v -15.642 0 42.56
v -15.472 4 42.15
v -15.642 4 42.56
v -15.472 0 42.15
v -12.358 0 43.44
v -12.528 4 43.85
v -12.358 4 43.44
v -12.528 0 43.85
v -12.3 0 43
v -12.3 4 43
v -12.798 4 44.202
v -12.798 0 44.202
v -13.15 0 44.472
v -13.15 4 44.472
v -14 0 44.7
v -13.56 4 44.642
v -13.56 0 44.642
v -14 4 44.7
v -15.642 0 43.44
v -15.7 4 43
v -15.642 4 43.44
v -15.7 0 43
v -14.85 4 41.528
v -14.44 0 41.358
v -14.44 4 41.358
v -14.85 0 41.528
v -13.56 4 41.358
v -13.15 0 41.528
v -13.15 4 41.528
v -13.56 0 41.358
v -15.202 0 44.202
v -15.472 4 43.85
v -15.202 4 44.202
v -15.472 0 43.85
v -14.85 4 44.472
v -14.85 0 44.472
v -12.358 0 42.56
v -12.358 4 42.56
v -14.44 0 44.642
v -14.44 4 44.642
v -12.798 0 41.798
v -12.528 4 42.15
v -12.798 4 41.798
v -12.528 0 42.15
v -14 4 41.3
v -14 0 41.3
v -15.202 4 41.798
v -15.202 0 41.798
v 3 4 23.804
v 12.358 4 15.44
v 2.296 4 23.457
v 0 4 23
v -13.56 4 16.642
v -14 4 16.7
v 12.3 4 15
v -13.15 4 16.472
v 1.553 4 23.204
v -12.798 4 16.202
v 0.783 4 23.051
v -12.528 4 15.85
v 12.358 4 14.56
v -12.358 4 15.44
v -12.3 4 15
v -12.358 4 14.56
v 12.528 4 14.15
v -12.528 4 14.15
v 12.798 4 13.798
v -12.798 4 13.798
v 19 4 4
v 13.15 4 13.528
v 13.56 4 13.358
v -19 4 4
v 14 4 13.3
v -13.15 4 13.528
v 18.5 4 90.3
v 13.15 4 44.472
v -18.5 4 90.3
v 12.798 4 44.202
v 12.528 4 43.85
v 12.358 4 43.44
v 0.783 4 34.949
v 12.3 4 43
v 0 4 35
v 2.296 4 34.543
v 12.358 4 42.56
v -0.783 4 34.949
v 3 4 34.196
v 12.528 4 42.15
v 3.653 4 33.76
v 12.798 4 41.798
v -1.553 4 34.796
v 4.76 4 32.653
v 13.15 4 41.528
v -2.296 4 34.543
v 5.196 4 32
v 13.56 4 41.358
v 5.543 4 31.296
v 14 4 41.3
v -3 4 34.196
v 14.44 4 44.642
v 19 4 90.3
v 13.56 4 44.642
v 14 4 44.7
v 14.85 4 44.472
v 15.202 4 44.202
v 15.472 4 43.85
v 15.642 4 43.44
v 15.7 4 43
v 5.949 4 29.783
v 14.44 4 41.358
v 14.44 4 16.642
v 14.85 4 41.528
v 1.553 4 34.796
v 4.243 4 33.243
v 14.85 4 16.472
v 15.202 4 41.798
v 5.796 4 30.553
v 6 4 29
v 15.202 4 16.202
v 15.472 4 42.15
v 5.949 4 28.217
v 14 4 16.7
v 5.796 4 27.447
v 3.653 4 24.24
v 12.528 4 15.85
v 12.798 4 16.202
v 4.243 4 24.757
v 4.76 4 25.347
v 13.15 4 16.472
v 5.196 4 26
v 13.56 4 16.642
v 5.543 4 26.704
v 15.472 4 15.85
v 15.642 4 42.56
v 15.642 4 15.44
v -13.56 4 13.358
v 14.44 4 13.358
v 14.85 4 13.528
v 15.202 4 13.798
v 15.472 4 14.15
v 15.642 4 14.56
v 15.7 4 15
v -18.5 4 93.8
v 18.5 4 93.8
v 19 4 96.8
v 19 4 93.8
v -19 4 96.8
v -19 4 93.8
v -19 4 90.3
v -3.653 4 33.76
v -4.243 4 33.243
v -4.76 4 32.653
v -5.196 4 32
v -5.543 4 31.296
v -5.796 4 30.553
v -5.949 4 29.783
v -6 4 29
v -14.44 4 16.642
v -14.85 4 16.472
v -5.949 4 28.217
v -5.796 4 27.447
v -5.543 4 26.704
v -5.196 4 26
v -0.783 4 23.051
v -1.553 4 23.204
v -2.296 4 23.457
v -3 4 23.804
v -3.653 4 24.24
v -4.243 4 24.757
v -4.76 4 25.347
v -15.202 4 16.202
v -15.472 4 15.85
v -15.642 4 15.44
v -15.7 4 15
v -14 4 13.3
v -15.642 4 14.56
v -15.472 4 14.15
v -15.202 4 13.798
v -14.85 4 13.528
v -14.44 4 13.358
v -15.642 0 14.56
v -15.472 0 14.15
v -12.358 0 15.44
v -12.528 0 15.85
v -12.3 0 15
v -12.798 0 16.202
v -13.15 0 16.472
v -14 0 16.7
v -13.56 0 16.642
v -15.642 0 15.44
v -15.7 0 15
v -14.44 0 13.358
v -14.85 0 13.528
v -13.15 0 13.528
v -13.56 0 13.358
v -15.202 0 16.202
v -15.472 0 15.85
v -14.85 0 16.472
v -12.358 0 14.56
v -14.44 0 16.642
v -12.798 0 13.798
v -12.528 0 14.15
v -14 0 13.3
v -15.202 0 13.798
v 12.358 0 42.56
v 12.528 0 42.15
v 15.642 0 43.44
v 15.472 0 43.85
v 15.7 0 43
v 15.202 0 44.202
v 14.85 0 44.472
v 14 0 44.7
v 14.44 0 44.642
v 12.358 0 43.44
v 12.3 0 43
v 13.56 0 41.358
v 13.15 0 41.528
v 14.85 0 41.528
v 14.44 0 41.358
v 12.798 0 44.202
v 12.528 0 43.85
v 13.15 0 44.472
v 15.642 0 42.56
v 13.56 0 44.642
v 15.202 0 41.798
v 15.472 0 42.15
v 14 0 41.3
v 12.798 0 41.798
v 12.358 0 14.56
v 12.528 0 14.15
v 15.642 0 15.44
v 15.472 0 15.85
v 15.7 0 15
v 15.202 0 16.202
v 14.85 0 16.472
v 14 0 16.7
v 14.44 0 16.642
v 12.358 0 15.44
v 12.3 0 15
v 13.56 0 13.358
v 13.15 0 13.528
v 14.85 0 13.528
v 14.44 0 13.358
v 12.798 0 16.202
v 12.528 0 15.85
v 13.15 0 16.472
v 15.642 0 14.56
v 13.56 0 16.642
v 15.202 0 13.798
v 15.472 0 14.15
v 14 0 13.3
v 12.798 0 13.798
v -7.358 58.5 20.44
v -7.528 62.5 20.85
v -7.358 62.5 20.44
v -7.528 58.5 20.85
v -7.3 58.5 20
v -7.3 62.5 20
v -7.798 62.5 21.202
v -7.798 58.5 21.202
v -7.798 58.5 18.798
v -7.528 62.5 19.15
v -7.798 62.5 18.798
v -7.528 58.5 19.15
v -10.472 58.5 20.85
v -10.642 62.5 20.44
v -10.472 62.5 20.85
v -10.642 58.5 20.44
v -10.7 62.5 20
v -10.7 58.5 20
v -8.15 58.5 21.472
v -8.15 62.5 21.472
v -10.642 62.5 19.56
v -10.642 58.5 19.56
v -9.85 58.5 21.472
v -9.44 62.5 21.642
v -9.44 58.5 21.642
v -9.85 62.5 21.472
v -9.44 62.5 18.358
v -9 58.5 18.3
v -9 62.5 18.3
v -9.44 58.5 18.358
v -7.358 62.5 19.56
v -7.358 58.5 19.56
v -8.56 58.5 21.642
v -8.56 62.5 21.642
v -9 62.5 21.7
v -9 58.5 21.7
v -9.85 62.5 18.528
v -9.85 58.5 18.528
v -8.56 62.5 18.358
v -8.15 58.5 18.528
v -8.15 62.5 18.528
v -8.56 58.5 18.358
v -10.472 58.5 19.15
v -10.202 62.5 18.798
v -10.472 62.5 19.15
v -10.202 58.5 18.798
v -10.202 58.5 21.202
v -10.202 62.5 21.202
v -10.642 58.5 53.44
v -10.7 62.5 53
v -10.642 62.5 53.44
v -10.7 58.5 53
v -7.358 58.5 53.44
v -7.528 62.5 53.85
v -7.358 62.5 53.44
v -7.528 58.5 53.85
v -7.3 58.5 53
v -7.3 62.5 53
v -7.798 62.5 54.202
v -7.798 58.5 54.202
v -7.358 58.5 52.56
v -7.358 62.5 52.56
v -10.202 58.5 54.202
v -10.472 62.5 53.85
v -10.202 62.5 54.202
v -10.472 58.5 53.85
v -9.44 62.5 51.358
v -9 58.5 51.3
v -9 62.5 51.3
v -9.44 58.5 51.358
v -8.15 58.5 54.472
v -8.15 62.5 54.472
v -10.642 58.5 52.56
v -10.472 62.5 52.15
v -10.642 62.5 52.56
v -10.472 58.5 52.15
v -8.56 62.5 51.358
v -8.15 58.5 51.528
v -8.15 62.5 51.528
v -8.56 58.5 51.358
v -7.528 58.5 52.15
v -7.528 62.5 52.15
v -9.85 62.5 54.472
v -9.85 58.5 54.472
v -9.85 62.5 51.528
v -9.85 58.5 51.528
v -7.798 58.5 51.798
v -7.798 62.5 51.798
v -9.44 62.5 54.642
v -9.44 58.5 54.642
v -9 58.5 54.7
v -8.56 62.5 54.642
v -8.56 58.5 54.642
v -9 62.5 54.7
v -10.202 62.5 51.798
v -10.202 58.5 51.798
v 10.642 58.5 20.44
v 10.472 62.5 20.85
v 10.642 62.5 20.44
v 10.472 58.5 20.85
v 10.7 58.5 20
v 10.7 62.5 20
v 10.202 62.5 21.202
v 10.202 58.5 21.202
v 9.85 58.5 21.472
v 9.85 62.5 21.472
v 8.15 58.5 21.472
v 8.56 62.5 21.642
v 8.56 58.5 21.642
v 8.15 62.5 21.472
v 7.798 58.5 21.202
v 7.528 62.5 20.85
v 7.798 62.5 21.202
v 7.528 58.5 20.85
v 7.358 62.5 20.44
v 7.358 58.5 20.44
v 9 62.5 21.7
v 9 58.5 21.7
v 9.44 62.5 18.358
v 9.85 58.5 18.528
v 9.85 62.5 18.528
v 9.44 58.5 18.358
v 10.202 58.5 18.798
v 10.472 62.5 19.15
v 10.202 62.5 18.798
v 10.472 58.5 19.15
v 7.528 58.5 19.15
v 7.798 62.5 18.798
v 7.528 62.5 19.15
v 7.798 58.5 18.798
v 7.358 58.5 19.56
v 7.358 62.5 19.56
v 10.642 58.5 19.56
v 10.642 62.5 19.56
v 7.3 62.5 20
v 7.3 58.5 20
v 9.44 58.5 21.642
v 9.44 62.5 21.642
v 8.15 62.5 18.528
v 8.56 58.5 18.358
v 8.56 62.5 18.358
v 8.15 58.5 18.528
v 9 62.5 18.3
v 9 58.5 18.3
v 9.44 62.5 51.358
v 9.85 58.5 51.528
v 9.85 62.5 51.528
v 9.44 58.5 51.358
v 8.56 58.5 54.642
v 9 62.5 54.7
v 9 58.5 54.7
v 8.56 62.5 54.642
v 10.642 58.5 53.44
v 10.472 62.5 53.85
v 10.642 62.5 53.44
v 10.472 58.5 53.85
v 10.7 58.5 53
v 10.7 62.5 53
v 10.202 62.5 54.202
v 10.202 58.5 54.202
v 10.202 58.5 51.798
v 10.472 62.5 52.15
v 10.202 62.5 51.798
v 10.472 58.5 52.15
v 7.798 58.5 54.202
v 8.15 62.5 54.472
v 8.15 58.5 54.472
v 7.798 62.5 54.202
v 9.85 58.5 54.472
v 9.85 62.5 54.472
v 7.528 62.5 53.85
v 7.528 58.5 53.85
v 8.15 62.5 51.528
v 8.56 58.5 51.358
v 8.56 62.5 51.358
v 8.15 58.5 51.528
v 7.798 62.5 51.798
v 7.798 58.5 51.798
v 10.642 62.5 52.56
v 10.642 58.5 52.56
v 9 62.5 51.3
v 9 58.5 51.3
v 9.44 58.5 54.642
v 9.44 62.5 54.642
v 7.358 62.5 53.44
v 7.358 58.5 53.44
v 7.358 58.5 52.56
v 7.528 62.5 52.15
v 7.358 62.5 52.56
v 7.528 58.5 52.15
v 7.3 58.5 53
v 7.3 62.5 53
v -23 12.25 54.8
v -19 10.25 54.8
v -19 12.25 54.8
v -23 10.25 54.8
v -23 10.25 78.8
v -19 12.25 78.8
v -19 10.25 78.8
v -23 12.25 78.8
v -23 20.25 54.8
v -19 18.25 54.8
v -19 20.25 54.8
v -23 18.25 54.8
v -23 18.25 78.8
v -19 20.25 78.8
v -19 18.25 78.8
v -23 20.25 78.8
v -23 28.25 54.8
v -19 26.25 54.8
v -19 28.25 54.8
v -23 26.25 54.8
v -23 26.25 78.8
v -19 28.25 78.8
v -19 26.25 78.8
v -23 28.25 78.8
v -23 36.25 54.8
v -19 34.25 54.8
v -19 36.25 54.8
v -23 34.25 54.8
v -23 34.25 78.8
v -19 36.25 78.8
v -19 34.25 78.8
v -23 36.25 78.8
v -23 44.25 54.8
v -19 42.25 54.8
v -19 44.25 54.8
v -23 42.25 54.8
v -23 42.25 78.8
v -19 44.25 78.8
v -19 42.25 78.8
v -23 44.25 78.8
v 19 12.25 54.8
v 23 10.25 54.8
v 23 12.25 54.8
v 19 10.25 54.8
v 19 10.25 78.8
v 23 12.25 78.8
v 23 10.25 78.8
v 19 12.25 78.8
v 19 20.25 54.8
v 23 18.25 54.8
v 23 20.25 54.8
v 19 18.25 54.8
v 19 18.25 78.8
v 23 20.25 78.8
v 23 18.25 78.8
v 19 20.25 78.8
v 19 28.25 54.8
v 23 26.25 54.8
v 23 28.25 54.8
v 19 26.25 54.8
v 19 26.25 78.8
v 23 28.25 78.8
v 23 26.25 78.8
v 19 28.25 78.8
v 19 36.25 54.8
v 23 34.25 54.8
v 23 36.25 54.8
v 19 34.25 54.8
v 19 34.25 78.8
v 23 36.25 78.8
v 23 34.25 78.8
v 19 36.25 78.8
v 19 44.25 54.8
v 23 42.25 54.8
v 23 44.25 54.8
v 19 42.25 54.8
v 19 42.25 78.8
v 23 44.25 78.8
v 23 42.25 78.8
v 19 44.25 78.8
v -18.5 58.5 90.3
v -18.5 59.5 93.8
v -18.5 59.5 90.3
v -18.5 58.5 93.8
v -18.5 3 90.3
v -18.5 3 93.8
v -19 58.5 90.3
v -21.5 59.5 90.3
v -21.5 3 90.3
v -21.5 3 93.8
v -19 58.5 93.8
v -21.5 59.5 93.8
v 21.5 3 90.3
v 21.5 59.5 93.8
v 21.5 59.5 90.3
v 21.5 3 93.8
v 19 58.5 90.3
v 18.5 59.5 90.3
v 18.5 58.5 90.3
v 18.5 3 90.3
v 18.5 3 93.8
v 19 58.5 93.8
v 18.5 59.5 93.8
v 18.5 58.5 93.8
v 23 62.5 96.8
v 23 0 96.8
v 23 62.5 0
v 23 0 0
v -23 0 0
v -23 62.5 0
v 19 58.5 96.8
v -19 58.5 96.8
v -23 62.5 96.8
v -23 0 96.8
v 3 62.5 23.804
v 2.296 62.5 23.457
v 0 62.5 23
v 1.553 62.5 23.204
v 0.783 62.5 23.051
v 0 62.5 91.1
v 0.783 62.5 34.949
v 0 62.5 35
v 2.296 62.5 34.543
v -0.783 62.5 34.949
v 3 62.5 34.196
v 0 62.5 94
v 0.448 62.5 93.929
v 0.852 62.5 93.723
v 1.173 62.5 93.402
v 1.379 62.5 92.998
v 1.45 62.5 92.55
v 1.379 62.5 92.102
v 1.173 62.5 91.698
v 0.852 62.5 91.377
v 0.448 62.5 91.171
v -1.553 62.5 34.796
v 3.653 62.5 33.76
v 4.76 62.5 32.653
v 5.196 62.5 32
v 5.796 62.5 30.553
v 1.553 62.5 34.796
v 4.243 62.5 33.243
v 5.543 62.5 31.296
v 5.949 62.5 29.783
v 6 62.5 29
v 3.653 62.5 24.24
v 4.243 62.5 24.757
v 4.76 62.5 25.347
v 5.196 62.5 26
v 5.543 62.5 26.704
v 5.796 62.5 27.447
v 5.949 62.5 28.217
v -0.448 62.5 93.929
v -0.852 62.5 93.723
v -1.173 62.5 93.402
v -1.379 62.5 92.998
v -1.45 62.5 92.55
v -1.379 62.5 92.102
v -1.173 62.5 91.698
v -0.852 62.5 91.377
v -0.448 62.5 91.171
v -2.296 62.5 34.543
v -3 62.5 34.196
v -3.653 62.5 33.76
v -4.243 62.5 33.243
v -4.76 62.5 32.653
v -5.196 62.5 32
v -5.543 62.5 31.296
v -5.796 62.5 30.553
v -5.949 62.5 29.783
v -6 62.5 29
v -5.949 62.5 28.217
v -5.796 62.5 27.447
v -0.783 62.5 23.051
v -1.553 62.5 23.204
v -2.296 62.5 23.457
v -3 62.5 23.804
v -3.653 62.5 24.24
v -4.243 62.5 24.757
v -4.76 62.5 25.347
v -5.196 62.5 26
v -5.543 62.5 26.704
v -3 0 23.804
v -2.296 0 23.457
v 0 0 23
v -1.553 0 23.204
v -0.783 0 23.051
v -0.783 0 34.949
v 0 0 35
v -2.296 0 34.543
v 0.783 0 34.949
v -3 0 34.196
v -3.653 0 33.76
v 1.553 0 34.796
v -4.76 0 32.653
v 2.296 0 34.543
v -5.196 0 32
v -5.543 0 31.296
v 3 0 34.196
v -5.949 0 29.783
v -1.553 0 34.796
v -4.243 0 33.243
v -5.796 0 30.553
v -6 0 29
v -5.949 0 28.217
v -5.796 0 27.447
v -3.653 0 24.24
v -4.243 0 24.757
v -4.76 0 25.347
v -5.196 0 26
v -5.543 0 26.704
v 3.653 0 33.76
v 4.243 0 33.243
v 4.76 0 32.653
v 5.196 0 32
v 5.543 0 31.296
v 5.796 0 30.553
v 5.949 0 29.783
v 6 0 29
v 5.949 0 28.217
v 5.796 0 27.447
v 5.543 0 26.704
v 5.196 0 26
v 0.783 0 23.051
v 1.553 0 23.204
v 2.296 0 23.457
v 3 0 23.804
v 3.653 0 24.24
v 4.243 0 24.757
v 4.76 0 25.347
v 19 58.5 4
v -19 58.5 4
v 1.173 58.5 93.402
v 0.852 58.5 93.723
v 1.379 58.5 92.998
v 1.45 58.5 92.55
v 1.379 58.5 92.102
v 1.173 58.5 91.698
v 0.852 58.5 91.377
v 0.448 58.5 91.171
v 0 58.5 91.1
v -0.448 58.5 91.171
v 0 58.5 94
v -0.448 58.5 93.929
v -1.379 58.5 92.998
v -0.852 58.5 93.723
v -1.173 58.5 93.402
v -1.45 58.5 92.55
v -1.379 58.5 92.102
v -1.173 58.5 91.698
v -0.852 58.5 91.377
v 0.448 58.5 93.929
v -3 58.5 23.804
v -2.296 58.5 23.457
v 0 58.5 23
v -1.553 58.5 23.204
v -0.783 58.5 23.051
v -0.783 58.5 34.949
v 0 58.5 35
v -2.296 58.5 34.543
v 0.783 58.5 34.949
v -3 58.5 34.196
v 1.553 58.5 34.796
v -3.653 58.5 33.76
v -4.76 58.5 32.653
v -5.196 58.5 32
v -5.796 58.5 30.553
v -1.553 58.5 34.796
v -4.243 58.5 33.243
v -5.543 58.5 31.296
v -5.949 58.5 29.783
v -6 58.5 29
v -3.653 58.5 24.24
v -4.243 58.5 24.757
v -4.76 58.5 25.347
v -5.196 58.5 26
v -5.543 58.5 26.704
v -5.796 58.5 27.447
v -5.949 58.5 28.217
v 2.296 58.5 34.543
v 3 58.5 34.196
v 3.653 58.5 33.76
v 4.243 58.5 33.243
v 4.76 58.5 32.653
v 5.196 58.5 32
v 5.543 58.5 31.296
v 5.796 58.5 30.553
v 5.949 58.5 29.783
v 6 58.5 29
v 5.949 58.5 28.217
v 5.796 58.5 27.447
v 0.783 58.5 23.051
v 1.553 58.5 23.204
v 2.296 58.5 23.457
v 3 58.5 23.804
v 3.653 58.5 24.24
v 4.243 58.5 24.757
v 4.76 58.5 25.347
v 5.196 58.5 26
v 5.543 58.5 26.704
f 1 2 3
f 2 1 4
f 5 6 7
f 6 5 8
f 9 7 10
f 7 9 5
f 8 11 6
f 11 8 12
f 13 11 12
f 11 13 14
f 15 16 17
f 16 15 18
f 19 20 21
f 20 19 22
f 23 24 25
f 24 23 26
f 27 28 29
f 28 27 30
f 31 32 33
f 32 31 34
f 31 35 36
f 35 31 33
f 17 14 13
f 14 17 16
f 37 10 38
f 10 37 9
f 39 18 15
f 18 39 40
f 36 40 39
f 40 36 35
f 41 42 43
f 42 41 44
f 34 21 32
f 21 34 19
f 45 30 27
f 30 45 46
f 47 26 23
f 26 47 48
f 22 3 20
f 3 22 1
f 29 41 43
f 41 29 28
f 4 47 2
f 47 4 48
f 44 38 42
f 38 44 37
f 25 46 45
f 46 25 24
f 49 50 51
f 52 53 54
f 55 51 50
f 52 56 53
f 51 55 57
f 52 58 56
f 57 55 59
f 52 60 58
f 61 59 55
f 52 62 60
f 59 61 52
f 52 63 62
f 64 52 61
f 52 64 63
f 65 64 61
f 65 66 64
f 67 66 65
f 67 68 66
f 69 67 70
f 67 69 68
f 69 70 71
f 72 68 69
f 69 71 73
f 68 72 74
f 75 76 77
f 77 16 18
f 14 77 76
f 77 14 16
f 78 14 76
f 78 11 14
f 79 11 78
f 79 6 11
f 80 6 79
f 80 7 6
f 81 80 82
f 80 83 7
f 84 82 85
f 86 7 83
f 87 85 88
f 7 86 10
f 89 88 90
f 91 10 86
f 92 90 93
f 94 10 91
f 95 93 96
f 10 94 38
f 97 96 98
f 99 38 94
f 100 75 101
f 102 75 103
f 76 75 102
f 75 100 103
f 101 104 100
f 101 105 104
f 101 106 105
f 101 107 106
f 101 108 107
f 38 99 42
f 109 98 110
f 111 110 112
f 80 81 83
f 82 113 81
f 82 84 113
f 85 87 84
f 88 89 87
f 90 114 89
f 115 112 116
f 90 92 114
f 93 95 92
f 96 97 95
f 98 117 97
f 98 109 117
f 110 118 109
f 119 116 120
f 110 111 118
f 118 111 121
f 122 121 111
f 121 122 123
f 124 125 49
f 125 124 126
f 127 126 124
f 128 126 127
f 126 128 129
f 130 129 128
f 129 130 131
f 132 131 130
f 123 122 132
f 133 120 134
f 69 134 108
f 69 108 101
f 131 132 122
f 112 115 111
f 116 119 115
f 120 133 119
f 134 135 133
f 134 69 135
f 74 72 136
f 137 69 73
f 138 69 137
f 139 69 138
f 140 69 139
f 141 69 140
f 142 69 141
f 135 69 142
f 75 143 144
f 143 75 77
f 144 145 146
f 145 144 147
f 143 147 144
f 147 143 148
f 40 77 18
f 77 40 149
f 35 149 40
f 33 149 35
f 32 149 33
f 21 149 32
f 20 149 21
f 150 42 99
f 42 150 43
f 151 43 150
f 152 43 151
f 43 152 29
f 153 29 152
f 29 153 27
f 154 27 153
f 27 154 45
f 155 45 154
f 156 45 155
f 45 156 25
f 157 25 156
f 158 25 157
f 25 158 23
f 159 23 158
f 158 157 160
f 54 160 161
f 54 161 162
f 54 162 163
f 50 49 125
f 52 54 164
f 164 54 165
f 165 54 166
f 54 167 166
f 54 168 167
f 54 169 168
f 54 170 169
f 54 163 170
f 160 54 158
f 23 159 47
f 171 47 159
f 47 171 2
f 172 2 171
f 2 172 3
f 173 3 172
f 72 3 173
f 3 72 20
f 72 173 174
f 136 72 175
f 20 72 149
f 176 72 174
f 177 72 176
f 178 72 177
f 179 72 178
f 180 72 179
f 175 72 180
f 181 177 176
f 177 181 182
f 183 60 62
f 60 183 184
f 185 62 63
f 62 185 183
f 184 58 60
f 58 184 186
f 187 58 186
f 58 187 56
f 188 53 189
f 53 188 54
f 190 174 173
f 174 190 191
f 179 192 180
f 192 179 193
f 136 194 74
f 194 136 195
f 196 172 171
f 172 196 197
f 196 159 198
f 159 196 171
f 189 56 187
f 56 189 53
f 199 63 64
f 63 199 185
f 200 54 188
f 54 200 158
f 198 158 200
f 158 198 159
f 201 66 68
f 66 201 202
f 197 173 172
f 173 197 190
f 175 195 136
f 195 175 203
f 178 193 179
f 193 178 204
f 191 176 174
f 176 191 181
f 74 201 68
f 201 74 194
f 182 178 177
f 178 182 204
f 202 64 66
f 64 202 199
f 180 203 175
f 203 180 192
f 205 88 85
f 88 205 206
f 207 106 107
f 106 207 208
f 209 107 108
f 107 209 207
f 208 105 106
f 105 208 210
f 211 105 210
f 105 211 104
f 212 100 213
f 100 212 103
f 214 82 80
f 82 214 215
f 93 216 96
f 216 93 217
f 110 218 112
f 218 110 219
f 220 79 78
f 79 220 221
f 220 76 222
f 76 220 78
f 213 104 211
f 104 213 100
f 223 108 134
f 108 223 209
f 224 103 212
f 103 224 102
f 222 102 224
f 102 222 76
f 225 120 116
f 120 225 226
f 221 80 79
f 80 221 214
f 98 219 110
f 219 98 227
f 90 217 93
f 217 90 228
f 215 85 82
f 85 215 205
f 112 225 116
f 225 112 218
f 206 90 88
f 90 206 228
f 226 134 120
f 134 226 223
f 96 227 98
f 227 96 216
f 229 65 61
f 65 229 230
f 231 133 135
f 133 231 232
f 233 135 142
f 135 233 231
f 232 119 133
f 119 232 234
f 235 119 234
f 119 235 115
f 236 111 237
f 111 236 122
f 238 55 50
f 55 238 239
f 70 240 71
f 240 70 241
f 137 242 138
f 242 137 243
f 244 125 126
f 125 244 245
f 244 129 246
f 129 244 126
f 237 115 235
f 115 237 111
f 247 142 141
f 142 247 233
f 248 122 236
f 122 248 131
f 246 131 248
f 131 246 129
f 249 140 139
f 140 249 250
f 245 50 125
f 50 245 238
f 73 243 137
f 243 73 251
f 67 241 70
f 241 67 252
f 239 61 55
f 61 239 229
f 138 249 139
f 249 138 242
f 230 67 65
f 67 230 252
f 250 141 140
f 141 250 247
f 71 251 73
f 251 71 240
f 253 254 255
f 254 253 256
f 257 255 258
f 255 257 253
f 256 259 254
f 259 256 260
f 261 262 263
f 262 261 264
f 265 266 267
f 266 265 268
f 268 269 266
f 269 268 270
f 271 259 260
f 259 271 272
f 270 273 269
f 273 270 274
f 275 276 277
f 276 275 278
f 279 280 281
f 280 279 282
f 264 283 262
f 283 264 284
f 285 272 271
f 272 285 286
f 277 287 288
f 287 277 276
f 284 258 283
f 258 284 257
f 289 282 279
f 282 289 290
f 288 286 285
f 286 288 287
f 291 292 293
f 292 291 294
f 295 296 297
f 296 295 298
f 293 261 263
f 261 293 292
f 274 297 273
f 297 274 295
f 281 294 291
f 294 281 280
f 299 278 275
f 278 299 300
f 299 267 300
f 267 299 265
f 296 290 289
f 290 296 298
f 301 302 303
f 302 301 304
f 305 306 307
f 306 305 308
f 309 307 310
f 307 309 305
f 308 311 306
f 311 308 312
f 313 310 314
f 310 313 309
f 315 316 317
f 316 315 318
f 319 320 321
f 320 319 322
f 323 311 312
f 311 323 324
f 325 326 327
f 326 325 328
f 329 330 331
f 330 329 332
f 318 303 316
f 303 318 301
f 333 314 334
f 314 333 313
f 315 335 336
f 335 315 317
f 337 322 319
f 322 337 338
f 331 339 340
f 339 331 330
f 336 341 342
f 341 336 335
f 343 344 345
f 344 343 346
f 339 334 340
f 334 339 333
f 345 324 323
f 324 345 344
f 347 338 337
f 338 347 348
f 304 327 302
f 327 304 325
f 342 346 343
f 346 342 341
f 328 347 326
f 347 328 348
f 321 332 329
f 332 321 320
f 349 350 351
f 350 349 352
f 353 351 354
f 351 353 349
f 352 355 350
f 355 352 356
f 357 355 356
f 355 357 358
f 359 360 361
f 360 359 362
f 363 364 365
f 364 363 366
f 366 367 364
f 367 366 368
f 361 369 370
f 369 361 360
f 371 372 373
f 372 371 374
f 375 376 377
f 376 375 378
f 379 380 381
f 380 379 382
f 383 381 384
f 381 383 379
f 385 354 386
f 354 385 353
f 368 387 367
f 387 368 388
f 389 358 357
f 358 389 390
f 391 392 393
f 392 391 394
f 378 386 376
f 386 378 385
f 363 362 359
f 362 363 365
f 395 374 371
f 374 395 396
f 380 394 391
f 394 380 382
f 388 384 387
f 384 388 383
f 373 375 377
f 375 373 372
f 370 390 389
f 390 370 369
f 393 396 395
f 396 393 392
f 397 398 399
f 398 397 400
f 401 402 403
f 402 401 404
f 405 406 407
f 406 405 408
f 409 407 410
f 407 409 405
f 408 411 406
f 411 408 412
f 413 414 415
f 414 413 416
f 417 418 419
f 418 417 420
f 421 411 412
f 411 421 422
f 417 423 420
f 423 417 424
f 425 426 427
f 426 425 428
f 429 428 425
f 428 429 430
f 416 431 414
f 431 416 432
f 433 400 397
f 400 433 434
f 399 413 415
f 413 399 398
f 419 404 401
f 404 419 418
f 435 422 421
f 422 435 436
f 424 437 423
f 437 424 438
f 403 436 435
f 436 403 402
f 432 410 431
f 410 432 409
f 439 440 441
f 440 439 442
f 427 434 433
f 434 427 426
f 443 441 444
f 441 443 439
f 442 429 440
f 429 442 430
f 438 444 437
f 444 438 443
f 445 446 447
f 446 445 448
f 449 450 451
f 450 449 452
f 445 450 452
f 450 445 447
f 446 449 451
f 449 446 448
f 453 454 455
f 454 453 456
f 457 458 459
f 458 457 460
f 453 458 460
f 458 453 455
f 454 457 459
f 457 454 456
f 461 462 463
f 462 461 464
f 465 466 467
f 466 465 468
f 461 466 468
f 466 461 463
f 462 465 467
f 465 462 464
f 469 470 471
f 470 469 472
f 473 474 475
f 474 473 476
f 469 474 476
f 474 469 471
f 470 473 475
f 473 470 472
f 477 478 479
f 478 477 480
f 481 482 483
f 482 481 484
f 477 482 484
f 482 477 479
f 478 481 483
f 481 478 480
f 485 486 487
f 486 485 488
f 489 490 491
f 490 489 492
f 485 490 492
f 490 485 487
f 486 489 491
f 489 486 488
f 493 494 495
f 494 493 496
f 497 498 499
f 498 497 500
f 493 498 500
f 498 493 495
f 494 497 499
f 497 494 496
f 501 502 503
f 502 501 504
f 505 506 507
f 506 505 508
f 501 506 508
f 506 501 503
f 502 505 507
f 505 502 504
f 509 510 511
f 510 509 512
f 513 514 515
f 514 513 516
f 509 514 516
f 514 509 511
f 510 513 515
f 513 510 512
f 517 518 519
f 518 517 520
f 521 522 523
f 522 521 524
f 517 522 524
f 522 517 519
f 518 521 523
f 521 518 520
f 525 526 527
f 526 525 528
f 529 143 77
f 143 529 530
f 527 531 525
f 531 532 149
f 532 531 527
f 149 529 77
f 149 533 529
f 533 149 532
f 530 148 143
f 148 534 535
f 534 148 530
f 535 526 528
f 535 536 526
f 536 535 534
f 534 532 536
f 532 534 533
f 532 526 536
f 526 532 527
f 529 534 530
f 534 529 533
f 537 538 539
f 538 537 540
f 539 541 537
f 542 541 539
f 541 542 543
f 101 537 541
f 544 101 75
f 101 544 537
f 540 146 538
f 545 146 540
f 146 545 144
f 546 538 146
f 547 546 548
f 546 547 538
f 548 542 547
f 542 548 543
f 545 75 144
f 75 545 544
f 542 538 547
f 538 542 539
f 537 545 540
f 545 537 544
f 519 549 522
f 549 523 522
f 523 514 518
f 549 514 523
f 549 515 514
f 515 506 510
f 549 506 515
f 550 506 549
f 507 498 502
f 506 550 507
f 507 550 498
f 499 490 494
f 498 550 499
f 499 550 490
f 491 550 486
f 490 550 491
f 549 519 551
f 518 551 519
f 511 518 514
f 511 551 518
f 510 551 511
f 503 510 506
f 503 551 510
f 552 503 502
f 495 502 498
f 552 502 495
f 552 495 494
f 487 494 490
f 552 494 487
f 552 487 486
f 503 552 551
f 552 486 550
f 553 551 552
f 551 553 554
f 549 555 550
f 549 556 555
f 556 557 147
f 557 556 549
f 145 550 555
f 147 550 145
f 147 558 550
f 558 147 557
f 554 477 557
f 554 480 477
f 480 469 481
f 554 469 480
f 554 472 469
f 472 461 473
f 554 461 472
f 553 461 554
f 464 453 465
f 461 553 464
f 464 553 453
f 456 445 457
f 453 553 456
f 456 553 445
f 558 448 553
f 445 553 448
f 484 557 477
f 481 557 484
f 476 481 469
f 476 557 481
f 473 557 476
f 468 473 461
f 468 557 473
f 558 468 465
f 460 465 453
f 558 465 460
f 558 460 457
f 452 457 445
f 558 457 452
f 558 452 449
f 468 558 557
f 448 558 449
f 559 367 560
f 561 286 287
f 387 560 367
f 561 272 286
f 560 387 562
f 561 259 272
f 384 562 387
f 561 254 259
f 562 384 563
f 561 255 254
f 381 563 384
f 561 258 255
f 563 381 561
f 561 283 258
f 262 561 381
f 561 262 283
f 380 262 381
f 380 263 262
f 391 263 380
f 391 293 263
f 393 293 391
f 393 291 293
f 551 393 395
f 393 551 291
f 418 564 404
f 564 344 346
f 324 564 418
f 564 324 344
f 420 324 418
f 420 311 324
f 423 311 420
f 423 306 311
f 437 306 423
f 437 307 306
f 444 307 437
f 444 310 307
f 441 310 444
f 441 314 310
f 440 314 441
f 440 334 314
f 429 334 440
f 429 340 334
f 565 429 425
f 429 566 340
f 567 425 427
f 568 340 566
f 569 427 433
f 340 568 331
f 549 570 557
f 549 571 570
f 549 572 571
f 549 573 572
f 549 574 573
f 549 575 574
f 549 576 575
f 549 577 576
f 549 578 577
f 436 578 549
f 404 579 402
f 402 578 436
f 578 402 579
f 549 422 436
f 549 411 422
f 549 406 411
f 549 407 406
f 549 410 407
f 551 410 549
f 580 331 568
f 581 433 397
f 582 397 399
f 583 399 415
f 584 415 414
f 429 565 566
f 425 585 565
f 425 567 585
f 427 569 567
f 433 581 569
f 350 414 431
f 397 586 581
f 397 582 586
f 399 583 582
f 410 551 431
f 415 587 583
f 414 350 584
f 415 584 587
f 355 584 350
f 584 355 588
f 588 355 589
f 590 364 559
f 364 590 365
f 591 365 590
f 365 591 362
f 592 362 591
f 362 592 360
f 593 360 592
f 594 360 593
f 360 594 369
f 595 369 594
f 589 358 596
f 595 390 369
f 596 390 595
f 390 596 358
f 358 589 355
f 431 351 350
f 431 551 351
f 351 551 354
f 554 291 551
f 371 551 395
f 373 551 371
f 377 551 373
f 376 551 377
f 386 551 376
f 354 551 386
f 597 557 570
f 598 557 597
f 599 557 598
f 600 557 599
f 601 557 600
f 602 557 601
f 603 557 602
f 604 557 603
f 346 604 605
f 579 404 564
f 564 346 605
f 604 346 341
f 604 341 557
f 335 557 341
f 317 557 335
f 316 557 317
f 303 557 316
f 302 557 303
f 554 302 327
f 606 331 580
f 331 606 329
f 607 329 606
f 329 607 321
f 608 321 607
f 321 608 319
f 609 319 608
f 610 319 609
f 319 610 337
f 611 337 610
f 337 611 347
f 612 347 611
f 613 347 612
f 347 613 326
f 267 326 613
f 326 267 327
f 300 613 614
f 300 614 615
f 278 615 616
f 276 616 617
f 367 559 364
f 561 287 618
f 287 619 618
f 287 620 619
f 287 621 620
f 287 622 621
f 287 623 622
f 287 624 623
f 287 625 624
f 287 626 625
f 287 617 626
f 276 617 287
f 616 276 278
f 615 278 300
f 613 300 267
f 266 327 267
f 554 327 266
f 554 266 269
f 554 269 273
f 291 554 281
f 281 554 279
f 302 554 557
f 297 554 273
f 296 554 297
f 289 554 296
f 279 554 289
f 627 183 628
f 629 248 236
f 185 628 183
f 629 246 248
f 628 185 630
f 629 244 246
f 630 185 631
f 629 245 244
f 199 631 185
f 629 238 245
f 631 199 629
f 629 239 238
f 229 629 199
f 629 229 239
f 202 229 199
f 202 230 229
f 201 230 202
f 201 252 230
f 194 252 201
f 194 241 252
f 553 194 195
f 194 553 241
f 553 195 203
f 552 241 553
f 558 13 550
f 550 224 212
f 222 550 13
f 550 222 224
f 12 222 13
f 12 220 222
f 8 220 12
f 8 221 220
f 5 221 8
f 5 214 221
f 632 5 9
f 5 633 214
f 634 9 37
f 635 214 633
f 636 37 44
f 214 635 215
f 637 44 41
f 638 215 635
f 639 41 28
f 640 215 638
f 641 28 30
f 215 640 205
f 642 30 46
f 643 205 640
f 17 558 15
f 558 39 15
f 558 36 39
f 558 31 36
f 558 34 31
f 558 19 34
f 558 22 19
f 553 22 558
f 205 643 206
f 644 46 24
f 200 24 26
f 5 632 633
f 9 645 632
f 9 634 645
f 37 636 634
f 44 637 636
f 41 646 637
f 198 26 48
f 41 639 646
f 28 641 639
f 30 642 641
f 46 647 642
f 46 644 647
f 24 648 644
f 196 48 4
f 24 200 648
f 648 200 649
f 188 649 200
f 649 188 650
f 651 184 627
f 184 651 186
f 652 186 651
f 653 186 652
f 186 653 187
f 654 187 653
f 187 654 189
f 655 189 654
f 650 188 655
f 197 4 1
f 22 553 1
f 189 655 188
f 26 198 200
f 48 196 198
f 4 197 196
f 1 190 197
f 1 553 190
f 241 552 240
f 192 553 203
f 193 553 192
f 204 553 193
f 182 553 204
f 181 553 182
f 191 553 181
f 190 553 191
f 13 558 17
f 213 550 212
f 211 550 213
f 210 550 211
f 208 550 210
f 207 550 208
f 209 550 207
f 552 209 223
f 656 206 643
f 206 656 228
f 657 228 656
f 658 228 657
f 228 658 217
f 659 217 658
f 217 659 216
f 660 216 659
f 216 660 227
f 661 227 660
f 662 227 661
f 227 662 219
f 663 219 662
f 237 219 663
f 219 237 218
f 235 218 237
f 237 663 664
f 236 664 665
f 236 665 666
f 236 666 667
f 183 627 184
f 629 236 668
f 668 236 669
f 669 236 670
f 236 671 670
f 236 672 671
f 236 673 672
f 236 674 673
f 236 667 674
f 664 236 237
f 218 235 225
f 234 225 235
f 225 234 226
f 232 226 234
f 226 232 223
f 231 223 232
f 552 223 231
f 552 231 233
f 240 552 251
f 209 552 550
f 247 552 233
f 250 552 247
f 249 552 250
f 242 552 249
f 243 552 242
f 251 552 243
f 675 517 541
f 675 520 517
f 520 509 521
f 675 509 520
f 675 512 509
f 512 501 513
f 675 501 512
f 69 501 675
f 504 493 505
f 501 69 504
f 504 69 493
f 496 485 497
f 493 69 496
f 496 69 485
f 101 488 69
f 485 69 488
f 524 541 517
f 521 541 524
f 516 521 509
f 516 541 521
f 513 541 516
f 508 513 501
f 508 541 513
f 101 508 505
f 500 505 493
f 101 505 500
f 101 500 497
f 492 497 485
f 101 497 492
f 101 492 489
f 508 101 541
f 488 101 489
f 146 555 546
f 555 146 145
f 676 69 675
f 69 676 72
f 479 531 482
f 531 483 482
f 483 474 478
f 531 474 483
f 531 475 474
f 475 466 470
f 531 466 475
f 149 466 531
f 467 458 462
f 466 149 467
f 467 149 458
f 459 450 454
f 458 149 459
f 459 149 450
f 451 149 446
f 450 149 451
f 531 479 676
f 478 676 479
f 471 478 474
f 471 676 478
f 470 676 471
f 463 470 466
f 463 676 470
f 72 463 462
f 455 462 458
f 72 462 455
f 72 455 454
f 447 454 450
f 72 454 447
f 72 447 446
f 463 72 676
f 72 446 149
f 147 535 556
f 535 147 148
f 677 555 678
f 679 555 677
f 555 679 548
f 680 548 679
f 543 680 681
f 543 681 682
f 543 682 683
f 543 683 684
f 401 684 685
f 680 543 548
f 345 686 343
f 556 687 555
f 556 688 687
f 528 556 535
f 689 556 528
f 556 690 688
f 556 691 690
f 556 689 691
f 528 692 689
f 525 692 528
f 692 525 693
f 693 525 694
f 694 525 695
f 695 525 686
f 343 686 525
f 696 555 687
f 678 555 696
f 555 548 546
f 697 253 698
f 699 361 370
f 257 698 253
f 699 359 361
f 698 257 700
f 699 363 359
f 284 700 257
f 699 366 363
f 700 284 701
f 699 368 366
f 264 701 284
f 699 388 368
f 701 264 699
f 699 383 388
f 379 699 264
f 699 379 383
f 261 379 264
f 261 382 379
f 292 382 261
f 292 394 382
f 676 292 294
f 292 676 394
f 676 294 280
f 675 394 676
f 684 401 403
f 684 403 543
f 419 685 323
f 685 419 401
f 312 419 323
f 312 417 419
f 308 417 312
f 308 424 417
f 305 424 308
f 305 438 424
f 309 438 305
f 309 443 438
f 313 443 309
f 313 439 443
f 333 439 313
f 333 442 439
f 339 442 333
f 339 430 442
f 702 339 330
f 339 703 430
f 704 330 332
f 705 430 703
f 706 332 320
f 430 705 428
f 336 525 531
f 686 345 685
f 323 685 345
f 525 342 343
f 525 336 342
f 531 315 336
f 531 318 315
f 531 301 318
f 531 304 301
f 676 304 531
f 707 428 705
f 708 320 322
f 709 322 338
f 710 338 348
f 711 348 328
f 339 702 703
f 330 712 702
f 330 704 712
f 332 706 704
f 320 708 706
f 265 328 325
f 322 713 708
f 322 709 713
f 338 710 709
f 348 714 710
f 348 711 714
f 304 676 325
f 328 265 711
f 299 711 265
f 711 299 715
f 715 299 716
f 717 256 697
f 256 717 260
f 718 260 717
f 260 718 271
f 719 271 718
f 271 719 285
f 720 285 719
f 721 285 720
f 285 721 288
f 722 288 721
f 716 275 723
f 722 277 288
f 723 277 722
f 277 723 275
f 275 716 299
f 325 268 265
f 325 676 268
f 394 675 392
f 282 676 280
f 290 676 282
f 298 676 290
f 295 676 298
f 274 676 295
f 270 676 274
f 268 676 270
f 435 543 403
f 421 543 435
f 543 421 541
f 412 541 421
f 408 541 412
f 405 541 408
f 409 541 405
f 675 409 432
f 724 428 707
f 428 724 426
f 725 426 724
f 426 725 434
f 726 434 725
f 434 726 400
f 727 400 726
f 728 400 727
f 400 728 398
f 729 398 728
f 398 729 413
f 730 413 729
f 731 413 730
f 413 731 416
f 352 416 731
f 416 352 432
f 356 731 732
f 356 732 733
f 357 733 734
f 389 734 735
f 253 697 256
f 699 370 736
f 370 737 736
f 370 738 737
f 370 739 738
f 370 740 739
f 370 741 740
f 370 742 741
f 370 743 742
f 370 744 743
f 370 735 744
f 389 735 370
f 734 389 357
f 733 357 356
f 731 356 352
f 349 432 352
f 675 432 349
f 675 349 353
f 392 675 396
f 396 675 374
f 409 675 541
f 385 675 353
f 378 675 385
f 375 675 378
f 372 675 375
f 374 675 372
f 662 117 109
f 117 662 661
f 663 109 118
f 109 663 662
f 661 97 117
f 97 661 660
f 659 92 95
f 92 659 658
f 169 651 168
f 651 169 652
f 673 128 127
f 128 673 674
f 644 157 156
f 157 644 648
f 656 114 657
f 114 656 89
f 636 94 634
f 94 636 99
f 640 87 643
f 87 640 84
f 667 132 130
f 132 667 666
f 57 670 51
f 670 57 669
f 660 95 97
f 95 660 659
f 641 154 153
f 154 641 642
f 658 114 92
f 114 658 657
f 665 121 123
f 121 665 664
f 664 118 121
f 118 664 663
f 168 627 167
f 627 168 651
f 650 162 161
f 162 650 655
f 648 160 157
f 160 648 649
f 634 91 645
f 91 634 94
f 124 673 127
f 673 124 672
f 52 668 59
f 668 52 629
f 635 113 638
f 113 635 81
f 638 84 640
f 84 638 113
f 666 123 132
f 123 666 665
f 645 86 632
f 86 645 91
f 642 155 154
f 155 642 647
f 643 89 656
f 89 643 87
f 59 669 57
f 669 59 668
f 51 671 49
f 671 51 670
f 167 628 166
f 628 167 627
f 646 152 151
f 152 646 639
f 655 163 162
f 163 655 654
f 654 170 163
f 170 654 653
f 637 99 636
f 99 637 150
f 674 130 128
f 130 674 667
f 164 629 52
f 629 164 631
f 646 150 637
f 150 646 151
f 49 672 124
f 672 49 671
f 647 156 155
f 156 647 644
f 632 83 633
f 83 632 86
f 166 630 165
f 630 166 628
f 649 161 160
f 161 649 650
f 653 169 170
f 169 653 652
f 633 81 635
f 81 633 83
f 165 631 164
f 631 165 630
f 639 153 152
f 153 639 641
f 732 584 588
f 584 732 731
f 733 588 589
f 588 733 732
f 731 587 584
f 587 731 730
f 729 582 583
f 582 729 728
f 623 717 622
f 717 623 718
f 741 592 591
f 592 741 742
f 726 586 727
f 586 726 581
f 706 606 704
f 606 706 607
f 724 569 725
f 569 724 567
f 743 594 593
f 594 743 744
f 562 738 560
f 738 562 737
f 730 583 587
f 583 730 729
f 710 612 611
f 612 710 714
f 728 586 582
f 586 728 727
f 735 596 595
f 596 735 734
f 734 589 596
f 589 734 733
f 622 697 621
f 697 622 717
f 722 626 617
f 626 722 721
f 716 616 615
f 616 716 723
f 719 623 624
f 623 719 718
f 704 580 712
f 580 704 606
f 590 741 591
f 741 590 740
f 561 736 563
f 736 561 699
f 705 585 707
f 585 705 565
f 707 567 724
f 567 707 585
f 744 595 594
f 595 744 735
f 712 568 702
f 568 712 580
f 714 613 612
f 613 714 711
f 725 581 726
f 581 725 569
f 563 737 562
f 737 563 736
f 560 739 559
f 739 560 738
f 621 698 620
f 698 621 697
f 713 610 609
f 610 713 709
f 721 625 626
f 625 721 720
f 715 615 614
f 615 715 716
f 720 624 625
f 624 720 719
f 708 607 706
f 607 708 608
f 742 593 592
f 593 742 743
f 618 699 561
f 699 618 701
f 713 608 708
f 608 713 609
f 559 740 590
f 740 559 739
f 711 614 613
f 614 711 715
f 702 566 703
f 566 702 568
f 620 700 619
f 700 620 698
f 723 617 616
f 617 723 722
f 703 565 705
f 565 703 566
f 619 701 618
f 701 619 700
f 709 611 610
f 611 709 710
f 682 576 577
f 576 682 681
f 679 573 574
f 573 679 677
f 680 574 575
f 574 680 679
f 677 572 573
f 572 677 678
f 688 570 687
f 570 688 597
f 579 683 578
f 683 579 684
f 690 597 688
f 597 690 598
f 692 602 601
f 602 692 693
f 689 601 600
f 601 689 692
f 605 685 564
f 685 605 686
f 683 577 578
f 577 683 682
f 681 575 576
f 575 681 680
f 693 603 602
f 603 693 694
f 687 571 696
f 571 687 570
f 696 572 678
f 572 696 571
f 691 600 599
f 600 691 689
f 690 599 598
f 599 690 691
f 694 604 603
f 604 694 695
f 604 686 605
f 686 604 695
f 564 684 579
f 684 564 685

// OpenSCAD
// ferris/motor_pod.scad (v7.1 embedded variant, 2026-09-10)
//   PART="pod"   : closed motor housing. Tower-side wall (4 x M3 into the tower
//                  pilots, counterbored from inside, Ø12 shaft hole), side walls,
//                  top, outer wall with the JGY-370 flange pattern (screws from
//                  outside into the gearbox). Bottom is OPEN (motor goes in from
//                  below, can hangs into the lower part) and closed by the cover.
//   PART="cover" : slide-in bottom cover (grooves in the side walls).
// Print: pod standing on its TOP wall (open bottom up) -> no bridges.
// Model coords: shaft axis = Y (tower face at y=0, outward = +y), Z up.

include <../params.scad>;

PART = "pod";

in_w = pod_in_w;  ow = in_w + 2*mpod_wall;       // 46
in_h = pod_top - pod_bottom;                    // 93
z0 = pod_bottom - 0;                            // open bottom at z = pod_bottom
z1 = pod_top + mpod_wall;

module pod_body() {
    difference() {
        translate([-ow/2, 0, z0]) cube([ow, pod_len, z1 - z0]);
        // cavity (open at the bottom)
        translate([-in_w/2, mpod_wall, z0 - 1]) cube([in_w, pod_len - 2*mpod_wall, pod_top - z0 + 1]);
        // tower-side wall: shaft hole + 4 x M3 with counterbore from inside
        translate([0, -1, 0]) rotate([-90, 0, 0]) cylinder(d = mb_shaft_clear_d, h = mpod_wall + 2, $fn = 48);
        for (sx = [-1, 1], sz = [-1, 1])
            translate([sx * mb_tower_hole_x, -1, sz * mb_tower_hole_z]) rotate([-90, 0, 0]) {
                cylinder(d = m3_clear, h = mpod_wall + 2, $fn = 24);
                translate([0, 0, mpod_wall + 1]) cylinder(d = 6.5, h = 6, $fn = 24);
            }
        // outer wall: gearbox flange pattern (18 x 33, shaft 9 below the upper row) + boss clearance
        translate([0, pod_len - mpod_wall - 1, 0]) rotate([-90, 0, 0]) cylinder(d = mb_flange_bore_d, h = mpod_wall + 2, $fn = 48);
        for (sx = [-1, 1])
            for (z = [motor_shaft_off - 6, motor_shaft_off - 6 - motor_hole_dz])
                translate([sx * motor_hole_dx/2, pod_len - mpod_wall - 1, z]) rotate([-90, 0, 0]) cylinder(d = motor_hole_d, h = mpod_wall + 2, $fn = 24);
        // vent slots on both side walls (lower part, beside the can)
        for (sx = [-1, 1], k = [0 : 4])
            translate([sx * (in_w/2 + mpod_wall/2), pod_len/2 - 20 + k * 8, pod_bottom + 30]) cube([mpod_wall + 2, pod_vent_w, 24], center = true);
        // cover grooves in the side walls, just above the open bottom
        for (sx = [-1, 1])
            translate([sx * (in_w/2 + 1), mpod_wall - 1, z0 + 3]) 
                translate([-1 - pod_cover_slot, 0, 0]) cube([2 + 2*pod_cover_slot, pod_len - 2*mpod_wall + 2, pod_cover_t + 2*pod_cover_slot]);
        // cover retaining screw (M3 self-tap through the outer wall into the cover edge)
        translate([0, pod_len - mpod_wall - 1, z0 + 3 + pod_cover_t/2]) rotate([-90, 0, 0]) cylinder(d = m3_thread, h = mpod_wall + 2, $fn = 20);
    }
}

module pod() {
    // print orientation: standing on the top wall -> rotate so that +z (top) becomes -z... i.e. flip
    translate([0, 0, z1]) mirror([0, 0, 1]) pod_body();
}

module cover() {
    // plate that slides into the grooves; a slot for the motor cable and a notch
    difference() {
        cube([in_w + 2, pod_len - 2*mpod_wall - 0.5, pod_cover_t], center = false);
        translate([in_w/2 + 1 - 6, 6, -1]) cube([12, 6, pod_cover_t + 2]);          // cable slot
    }
}

if (PART == "pod") pod();
else if (PART == "cover") cover();
